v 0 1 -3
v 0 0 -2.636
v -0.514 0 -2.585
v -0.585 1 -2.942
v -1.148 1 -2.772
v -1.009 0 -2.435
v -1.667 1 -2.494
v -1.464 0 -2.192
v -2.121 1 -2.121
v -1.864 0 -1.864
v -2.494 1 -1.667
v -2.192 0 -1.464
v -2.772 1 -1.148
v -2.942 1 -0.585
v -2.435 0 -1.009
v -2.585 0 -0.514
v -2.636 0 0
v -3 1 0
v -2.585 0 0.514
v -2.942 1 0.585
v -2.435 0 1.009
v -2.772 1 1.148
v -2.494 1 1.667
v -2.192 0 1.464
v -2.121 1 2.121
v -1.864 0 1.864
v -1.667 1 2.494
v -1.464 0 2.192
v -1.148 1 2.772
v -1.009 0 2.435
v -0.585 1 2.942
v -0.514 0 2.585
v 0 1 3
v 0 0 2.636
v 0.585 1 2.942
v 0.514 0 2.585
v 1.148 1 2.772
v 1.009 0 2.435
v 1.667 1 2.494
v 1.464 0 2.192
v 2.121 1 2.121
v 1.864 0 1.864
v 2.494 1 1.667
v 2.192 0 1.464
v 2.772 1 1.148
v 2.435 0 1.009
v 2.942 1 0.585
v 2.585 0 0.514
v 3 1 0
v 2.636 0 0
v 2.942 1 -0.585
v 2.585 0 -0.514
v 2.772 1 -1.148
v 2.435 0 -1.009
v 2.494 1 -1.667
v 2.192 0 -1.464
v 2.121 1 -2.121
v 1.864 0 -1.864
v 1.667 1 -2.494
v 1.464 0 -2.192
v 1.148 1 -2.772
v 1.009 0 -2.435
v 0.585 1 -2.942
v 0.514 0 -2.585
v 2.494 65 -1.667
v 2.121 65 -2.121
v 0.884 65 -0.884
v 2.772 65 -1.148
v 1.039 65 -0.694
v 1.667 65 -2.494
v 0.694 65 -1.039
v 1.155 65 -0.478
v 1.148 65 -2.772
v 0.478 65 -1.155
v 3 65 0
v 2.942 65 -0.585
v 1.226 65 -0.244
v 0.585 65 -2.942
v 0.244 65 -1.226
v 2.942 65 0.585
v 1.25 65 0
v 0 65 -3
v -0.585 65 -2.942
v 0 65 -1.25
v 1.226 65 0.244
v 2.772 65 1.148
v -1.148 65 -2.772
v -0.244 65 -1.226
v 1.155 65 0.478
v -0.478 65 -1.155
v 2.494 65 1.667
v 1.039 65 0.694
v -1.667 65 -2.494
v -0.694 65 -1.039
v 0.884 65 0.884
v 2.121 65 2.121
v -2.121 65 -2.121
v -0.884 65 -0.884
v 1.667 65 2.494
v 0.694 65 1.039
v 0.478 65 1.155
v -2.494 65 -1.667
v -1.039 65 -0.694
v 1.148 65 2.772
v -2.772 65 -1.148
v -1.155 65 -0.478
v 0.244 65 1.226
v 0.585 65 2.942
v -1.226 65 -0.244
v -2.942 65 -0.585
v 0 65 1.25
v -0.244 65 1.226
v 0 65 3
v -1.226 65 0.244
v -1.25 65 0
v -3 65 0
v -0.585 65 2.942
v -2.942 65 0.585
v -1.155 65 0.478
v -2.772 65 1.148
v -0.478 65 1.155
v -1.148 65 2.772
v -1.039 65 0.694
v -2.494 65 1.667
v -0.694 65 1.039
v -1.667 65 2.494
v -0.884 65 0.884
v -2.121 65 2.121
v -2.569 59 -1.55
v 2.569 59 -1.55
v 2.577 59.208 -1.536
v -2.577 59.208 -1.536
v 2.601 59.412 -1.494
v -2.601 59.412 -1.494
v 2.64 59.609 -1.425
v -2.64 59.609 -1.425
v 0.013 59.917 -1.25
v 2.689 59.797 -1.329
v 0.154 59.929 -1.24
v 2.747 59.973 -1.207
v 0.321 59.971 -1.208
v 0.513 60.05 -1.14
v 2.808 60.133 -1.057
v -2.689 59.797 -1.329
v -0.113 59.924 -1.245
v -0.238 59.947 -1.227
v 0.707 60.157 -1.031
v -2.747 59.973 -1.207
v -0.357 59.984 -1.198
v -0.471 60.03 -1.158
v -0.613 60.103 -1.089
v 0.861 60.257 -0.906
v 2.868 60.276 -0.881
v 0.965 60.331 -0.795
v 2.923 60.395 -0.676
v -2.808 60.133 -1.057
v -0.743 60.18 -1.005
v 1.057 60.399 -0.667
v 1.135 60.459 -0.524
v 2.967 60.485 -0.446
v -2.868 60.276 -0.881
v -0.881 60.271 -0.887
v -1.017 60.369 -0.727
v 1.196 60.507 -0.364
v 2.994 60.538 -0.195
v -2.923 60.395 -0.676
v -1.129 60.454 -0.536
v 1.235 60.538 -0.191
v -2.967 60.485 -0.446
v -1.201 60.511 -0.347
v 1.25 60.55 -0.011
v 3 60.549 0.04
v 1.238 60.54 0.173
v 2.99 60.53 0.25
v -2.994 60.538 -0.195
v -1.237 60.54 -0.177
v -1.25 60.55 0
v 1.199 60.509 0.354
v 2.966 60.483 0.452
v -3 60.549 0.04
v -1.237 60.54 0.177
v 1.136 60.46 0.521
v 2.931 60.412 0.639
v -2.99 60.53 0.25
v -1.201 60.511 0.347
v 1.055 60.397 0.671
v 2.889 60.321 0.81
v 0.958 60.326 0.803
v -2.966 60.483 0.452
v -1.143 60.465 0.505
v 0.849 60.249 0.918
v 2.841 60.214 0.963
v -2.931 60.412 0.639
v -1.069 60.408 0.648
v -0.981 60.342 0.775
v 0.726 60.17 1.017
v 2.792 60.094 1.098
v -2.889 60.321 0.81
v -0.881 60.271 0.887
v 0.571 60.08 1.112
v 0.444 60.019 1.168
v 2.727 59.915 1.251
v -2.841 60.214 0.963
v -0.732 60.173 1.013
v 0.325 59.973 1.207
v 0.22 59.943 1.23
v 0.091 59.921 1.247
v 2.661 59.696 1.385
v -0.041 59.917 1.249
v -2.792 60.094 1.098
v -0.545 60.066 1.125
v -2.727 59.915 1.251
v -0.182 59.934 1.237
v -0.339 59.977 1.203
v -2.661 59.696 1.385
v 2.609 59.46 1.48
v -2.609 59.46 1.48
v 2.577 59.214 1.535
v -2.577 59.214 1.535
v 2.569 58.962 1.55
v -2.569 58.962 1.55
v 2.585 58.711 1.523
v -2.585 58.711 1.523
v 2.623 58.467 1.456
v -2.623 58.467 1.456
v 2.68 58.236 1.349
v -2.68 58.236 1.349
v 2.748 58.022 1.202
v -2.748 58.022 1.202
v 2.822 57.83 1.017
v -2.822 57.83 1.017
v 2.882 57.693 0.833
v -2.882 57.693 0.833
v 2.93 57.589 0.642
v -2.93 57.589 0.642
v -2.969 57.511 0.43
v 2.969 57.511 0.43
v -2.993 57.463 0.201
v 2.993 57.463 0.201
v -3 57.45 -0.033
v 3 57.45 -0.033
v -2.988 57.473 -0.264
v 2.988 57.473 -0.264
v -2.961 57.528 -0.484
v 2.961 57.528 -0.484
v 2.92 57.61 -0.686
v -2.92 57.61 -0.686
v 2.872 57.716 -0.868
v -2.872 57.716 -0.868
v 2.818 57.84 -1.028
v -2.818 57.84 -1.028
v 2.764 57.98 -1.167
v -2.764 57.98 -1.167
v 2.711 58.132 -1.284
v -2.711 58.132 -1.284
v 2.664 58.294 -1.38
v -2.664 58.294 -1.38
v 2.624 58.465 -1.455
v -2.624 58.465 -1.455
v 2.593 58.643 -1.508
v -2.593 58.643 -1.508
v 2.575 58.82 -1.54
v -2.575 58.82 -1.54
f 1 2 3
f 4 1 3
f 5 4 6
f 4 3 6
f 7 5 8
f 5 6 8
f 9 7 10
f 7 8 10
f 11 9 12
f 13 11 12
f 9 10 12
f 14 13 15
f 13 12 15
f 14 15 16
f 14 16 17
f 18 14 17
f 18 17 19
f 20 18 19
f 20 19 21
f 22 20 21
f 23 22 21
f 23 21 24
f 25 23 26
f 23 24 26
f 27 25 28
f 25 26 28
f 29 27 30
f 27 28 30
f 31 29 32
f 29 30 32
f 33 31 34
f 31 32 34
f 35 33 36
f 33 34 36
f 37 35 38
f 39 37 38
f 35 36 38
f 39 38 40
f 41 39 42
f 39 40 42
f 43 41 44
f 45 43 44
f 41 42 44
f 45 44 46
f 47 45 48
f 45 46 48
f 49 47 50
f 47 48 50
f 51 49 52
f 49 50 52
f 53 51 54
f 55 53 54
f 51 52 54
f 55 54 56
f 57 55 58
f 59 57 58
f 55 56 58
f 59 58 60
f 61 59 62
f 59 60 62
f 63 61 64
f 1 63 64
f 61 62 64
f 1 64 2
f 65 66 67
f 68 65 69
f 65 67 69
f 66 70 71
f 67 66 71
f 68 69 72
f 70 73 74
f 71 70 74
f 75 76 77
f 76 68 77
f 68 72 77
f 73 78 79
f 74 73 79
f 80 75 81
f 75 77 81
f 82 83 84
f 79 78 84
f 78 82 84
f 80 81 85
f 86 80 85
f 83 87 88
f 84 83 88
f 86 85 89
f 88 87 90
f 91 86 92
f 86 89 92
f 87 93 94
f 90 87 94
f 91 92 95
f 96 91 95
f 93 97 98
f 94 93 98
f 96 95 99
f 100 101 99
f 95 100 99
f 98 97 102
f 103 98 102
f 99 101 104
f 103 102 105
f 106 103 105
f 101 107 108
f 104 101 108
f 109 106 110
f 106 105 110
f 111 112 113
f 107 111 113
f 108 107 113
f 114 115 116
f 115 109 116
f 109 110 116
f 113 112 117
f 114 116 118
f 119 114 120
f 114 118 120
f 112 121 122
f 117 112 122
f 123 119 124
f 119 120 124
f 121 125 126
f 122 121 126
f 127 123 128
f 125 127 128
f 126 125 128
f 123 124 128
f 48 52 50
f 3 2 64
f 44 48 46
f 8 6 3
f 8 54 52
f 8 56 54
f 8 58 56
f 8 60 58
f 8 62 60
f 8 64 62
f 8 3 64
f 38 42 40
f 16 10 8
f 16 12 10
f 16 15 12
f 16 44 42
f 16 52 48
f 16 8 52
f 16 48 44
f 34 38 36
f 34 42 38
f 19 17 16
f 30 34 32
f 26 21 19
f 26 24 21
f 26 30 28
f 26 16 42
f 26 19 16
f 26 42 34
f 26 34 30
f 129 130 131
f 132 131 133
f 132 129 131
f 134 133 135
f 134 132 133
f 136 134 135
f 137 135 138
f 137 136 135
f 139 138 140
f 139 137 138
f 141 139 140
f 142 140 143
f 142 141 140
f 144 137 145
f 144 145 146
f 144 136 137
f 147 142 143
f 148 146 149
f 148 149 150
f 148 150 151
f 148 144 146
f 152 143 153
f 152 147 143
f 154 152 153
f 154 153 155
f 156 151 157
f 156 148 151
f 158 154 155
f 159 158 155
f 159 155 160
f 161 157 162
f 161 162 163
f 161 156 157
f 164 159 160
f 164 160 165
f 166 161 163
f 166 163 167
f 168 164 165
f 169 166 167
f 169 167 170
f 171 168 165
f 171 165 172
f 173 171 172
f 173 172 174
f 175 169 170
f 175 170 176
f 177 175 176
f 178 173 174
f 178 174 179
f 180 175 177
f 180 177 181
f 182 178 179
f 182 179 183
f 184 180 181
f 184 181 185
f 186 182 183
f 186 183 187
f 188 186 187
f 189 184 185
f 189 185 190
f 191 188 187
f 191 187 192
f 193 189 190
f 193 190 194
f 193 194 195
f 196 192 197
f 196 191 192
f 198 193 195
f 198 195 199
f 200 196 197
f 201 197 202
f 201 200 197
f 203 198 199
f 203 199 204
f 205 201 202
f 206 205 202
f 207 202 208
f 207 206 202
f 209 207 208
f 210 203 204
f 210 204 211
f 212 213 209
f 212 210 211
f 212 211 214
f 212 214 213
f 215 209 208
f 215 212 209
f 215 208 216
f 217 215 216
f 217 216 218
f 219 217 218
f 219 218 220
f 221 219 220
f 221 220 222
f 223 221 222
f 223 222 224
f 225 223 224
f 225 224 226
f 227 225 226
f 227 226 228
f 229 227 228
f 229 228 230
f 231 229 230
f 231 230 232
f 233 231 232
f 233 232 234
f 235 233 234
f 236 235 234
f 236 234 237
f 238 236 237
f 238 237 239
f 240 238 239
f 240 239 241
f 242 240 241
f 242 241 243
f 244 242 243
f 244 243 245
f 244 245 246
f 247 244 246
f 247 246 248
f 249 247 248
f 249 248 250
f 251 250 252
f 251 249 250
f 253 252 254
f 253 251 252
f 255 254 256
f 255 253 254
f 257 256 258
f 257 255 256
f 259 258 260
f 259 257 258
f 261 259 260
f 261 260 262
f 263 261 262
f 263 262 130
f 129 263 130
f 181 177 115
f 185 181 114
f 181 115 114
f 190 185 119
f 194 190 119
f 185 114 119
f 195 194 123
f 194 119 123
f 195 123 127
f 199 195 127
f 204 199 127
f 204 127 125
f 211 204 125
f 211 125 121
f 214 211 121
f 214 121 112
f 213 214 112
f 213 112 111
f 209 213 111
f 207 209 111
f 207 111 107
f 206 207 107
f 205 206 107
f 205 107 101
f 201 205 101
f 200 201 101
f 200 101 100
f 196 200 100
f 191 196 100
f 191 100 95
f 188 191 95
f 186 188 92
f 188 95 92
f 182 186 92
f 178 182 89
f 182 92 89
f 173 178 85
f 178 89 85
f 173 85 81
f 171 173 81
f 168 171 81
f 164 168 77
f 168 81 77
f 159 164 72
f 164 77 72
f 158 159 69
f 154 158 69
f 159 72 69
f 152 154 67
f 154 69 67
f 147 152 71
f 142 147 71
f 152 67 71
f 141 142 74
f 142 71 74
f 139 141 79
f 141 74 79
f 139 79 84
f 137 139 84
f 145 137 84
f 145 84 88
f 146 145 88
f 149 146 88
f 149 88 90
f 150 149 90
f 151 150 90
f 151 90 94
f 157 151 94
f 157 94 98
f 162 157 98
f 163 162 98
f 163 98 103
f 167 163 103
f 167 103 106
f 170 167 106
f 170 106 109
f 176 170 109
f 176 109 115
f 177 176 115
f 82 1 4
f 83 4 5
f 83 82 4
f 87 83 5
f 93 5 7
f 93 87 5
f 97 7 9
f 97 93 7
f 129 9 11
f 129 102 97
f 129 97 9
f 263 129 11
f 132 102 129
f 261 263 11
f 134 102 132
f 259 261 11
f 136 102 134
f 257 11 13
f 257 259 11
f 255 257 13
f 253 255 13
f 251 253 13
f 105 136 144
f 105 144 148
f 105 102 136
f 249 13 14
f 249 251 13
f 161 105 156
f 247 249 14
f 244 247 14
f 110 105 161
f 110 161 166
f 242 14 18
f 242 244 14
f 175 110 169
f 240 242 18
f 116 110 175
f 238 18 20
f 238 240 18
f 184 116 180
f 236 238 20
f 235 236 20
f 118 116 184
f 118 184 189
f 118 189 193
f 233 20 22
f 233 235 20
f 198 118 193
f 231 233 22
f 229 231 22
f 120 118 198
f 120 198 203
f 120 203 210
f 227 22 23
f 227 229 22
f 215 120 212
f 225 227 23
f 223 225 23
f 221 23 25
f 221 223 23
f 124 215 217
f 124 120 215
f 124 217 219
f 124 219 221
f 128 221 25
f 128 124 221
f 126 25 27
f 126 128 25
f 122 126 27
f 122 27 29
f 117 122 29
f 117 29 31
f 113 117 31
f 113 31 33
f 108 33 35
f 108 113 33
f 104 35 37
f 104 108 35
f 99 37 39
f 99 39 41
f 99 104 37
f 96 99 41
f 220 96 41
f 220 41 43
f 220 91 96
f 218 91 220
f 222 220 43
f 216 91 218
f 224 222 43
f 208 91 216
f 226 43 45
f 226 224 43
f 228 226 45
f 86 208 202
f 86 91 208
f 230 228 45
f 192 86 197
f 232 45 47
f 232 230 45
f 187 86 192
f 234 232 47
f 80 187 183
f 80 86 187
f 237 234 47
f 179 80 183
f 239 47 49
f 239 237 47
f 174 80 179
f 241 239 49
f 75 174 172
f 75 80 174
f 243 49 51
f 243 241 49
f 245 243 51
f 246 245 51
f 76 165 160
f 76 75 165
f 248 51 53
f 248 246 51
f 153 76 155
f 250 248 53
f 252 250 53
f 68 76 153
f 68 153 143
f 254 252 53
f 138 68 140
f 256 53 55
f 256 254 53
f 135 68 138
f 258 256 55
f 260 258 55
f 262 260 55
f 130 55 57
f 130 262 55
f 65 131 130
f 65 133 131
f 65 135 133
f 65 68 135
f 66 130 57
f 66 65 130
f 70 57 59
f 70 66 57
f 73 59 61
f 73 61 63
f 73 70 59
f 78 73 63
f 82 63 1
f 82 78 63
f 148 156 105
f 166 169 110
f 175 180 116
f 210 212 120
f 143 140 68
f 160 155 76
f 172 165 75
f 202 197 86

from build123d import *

# Parameters (mm, degrees)
SKETCH1_W                  = 3
SKETCH1_H                  = 65
CUT_EXTRUDE1_DEPTH         = 66.138314378
CUT_EXTRUDE1_DEPTH_BACK    = 66.138314378
SKETCH2_R                  = 1.55
M3X0_5_TAPPED_HOLE1_REACH  = 67.138
M3X0_5_TAPPED_HOLE1_BORE_R = 1.25
CHAMFER1_SIZE              = 1
CHAMFER1_SIZE2             = 0.363970234


with BuildPart() as part:
    # Sketch1 → Revolve1 (revolve)
    with BuildSketch(Plane.XY, mode=Mode.PRIVATE) as revolve1_sk:
        with Locations((1.5, 32.5)):
            Rectangle(SKETCH1_W, SKETCH1_H)
    revolve(revolve1_sk.sketch.rotate(Axis((0, -5.428885746, 0), (0, 1, 0)), 90), axis=Axis((0, -5.428885746, 0), (0, 1, 0)))

    # Sketch2 → Cut-Extrude1 (cut, two sides: drawn at the far end of the back side and taken through both)
    with BuildSketch(Plane(origin=(0, 0, 0), x_dir=(0, 0, -1), z_dir=(1, 0, 0)).offset(-CUT_EXTRUDE1_DEPTH_BACK)):
        with Locations((0, 59)):
            Circle(SKETCH2_R)
    extrude(amount=CUT_EXTRUDE1_DEPTH + CUT_EXTRUDE1_DEPTH_BACK, mode=Mode.SUBTRACT)

    # M3x0.5 Tapped Hole1 bore → M3x0.5 Tapped Hole1 (cut, up to next)
    with BuildSketch(Plane(origin=(0, 65, 0), x_dir=(-1, 0, 0), z_dir=(0, 1, 0)), mode=Mode.PRIVATE) as m3x0_5_tapped_hole1_sk1:
        Circle(M3X0_5_TAPPED_HOLE1_BORE_R)
    m3x0_5_tapped_hole1_tool1 = extrude(m3x0_5_tapped_hole1_sk1.sketch, amount=-M3X0_5_TAPPED_HOLE1_REACH, mode=Mode.PRIVATE) & part.part
    add(m3x0_5_tapped_hole1_tool1.solids().sort_by_distance((0, 65, 0))[0], mode=Mode.SUBTRACT)

    # Chamfer1
    chamfer1_edges = [part.edges().sort_by_distance(p)[0] for p in [
        (0, 0, 3),
    ]]
    chamfer1_side = [part.faces().sort_by_distance(p)[0] for p in [
        (0, 32.5, 3),
    ]]
    chamfer(chamfer1_edges, length=CHAMFER1_SIZE, length2=CHAMFER1_SIZE2, reference=chamfer1_side[0])


solid = part.part
